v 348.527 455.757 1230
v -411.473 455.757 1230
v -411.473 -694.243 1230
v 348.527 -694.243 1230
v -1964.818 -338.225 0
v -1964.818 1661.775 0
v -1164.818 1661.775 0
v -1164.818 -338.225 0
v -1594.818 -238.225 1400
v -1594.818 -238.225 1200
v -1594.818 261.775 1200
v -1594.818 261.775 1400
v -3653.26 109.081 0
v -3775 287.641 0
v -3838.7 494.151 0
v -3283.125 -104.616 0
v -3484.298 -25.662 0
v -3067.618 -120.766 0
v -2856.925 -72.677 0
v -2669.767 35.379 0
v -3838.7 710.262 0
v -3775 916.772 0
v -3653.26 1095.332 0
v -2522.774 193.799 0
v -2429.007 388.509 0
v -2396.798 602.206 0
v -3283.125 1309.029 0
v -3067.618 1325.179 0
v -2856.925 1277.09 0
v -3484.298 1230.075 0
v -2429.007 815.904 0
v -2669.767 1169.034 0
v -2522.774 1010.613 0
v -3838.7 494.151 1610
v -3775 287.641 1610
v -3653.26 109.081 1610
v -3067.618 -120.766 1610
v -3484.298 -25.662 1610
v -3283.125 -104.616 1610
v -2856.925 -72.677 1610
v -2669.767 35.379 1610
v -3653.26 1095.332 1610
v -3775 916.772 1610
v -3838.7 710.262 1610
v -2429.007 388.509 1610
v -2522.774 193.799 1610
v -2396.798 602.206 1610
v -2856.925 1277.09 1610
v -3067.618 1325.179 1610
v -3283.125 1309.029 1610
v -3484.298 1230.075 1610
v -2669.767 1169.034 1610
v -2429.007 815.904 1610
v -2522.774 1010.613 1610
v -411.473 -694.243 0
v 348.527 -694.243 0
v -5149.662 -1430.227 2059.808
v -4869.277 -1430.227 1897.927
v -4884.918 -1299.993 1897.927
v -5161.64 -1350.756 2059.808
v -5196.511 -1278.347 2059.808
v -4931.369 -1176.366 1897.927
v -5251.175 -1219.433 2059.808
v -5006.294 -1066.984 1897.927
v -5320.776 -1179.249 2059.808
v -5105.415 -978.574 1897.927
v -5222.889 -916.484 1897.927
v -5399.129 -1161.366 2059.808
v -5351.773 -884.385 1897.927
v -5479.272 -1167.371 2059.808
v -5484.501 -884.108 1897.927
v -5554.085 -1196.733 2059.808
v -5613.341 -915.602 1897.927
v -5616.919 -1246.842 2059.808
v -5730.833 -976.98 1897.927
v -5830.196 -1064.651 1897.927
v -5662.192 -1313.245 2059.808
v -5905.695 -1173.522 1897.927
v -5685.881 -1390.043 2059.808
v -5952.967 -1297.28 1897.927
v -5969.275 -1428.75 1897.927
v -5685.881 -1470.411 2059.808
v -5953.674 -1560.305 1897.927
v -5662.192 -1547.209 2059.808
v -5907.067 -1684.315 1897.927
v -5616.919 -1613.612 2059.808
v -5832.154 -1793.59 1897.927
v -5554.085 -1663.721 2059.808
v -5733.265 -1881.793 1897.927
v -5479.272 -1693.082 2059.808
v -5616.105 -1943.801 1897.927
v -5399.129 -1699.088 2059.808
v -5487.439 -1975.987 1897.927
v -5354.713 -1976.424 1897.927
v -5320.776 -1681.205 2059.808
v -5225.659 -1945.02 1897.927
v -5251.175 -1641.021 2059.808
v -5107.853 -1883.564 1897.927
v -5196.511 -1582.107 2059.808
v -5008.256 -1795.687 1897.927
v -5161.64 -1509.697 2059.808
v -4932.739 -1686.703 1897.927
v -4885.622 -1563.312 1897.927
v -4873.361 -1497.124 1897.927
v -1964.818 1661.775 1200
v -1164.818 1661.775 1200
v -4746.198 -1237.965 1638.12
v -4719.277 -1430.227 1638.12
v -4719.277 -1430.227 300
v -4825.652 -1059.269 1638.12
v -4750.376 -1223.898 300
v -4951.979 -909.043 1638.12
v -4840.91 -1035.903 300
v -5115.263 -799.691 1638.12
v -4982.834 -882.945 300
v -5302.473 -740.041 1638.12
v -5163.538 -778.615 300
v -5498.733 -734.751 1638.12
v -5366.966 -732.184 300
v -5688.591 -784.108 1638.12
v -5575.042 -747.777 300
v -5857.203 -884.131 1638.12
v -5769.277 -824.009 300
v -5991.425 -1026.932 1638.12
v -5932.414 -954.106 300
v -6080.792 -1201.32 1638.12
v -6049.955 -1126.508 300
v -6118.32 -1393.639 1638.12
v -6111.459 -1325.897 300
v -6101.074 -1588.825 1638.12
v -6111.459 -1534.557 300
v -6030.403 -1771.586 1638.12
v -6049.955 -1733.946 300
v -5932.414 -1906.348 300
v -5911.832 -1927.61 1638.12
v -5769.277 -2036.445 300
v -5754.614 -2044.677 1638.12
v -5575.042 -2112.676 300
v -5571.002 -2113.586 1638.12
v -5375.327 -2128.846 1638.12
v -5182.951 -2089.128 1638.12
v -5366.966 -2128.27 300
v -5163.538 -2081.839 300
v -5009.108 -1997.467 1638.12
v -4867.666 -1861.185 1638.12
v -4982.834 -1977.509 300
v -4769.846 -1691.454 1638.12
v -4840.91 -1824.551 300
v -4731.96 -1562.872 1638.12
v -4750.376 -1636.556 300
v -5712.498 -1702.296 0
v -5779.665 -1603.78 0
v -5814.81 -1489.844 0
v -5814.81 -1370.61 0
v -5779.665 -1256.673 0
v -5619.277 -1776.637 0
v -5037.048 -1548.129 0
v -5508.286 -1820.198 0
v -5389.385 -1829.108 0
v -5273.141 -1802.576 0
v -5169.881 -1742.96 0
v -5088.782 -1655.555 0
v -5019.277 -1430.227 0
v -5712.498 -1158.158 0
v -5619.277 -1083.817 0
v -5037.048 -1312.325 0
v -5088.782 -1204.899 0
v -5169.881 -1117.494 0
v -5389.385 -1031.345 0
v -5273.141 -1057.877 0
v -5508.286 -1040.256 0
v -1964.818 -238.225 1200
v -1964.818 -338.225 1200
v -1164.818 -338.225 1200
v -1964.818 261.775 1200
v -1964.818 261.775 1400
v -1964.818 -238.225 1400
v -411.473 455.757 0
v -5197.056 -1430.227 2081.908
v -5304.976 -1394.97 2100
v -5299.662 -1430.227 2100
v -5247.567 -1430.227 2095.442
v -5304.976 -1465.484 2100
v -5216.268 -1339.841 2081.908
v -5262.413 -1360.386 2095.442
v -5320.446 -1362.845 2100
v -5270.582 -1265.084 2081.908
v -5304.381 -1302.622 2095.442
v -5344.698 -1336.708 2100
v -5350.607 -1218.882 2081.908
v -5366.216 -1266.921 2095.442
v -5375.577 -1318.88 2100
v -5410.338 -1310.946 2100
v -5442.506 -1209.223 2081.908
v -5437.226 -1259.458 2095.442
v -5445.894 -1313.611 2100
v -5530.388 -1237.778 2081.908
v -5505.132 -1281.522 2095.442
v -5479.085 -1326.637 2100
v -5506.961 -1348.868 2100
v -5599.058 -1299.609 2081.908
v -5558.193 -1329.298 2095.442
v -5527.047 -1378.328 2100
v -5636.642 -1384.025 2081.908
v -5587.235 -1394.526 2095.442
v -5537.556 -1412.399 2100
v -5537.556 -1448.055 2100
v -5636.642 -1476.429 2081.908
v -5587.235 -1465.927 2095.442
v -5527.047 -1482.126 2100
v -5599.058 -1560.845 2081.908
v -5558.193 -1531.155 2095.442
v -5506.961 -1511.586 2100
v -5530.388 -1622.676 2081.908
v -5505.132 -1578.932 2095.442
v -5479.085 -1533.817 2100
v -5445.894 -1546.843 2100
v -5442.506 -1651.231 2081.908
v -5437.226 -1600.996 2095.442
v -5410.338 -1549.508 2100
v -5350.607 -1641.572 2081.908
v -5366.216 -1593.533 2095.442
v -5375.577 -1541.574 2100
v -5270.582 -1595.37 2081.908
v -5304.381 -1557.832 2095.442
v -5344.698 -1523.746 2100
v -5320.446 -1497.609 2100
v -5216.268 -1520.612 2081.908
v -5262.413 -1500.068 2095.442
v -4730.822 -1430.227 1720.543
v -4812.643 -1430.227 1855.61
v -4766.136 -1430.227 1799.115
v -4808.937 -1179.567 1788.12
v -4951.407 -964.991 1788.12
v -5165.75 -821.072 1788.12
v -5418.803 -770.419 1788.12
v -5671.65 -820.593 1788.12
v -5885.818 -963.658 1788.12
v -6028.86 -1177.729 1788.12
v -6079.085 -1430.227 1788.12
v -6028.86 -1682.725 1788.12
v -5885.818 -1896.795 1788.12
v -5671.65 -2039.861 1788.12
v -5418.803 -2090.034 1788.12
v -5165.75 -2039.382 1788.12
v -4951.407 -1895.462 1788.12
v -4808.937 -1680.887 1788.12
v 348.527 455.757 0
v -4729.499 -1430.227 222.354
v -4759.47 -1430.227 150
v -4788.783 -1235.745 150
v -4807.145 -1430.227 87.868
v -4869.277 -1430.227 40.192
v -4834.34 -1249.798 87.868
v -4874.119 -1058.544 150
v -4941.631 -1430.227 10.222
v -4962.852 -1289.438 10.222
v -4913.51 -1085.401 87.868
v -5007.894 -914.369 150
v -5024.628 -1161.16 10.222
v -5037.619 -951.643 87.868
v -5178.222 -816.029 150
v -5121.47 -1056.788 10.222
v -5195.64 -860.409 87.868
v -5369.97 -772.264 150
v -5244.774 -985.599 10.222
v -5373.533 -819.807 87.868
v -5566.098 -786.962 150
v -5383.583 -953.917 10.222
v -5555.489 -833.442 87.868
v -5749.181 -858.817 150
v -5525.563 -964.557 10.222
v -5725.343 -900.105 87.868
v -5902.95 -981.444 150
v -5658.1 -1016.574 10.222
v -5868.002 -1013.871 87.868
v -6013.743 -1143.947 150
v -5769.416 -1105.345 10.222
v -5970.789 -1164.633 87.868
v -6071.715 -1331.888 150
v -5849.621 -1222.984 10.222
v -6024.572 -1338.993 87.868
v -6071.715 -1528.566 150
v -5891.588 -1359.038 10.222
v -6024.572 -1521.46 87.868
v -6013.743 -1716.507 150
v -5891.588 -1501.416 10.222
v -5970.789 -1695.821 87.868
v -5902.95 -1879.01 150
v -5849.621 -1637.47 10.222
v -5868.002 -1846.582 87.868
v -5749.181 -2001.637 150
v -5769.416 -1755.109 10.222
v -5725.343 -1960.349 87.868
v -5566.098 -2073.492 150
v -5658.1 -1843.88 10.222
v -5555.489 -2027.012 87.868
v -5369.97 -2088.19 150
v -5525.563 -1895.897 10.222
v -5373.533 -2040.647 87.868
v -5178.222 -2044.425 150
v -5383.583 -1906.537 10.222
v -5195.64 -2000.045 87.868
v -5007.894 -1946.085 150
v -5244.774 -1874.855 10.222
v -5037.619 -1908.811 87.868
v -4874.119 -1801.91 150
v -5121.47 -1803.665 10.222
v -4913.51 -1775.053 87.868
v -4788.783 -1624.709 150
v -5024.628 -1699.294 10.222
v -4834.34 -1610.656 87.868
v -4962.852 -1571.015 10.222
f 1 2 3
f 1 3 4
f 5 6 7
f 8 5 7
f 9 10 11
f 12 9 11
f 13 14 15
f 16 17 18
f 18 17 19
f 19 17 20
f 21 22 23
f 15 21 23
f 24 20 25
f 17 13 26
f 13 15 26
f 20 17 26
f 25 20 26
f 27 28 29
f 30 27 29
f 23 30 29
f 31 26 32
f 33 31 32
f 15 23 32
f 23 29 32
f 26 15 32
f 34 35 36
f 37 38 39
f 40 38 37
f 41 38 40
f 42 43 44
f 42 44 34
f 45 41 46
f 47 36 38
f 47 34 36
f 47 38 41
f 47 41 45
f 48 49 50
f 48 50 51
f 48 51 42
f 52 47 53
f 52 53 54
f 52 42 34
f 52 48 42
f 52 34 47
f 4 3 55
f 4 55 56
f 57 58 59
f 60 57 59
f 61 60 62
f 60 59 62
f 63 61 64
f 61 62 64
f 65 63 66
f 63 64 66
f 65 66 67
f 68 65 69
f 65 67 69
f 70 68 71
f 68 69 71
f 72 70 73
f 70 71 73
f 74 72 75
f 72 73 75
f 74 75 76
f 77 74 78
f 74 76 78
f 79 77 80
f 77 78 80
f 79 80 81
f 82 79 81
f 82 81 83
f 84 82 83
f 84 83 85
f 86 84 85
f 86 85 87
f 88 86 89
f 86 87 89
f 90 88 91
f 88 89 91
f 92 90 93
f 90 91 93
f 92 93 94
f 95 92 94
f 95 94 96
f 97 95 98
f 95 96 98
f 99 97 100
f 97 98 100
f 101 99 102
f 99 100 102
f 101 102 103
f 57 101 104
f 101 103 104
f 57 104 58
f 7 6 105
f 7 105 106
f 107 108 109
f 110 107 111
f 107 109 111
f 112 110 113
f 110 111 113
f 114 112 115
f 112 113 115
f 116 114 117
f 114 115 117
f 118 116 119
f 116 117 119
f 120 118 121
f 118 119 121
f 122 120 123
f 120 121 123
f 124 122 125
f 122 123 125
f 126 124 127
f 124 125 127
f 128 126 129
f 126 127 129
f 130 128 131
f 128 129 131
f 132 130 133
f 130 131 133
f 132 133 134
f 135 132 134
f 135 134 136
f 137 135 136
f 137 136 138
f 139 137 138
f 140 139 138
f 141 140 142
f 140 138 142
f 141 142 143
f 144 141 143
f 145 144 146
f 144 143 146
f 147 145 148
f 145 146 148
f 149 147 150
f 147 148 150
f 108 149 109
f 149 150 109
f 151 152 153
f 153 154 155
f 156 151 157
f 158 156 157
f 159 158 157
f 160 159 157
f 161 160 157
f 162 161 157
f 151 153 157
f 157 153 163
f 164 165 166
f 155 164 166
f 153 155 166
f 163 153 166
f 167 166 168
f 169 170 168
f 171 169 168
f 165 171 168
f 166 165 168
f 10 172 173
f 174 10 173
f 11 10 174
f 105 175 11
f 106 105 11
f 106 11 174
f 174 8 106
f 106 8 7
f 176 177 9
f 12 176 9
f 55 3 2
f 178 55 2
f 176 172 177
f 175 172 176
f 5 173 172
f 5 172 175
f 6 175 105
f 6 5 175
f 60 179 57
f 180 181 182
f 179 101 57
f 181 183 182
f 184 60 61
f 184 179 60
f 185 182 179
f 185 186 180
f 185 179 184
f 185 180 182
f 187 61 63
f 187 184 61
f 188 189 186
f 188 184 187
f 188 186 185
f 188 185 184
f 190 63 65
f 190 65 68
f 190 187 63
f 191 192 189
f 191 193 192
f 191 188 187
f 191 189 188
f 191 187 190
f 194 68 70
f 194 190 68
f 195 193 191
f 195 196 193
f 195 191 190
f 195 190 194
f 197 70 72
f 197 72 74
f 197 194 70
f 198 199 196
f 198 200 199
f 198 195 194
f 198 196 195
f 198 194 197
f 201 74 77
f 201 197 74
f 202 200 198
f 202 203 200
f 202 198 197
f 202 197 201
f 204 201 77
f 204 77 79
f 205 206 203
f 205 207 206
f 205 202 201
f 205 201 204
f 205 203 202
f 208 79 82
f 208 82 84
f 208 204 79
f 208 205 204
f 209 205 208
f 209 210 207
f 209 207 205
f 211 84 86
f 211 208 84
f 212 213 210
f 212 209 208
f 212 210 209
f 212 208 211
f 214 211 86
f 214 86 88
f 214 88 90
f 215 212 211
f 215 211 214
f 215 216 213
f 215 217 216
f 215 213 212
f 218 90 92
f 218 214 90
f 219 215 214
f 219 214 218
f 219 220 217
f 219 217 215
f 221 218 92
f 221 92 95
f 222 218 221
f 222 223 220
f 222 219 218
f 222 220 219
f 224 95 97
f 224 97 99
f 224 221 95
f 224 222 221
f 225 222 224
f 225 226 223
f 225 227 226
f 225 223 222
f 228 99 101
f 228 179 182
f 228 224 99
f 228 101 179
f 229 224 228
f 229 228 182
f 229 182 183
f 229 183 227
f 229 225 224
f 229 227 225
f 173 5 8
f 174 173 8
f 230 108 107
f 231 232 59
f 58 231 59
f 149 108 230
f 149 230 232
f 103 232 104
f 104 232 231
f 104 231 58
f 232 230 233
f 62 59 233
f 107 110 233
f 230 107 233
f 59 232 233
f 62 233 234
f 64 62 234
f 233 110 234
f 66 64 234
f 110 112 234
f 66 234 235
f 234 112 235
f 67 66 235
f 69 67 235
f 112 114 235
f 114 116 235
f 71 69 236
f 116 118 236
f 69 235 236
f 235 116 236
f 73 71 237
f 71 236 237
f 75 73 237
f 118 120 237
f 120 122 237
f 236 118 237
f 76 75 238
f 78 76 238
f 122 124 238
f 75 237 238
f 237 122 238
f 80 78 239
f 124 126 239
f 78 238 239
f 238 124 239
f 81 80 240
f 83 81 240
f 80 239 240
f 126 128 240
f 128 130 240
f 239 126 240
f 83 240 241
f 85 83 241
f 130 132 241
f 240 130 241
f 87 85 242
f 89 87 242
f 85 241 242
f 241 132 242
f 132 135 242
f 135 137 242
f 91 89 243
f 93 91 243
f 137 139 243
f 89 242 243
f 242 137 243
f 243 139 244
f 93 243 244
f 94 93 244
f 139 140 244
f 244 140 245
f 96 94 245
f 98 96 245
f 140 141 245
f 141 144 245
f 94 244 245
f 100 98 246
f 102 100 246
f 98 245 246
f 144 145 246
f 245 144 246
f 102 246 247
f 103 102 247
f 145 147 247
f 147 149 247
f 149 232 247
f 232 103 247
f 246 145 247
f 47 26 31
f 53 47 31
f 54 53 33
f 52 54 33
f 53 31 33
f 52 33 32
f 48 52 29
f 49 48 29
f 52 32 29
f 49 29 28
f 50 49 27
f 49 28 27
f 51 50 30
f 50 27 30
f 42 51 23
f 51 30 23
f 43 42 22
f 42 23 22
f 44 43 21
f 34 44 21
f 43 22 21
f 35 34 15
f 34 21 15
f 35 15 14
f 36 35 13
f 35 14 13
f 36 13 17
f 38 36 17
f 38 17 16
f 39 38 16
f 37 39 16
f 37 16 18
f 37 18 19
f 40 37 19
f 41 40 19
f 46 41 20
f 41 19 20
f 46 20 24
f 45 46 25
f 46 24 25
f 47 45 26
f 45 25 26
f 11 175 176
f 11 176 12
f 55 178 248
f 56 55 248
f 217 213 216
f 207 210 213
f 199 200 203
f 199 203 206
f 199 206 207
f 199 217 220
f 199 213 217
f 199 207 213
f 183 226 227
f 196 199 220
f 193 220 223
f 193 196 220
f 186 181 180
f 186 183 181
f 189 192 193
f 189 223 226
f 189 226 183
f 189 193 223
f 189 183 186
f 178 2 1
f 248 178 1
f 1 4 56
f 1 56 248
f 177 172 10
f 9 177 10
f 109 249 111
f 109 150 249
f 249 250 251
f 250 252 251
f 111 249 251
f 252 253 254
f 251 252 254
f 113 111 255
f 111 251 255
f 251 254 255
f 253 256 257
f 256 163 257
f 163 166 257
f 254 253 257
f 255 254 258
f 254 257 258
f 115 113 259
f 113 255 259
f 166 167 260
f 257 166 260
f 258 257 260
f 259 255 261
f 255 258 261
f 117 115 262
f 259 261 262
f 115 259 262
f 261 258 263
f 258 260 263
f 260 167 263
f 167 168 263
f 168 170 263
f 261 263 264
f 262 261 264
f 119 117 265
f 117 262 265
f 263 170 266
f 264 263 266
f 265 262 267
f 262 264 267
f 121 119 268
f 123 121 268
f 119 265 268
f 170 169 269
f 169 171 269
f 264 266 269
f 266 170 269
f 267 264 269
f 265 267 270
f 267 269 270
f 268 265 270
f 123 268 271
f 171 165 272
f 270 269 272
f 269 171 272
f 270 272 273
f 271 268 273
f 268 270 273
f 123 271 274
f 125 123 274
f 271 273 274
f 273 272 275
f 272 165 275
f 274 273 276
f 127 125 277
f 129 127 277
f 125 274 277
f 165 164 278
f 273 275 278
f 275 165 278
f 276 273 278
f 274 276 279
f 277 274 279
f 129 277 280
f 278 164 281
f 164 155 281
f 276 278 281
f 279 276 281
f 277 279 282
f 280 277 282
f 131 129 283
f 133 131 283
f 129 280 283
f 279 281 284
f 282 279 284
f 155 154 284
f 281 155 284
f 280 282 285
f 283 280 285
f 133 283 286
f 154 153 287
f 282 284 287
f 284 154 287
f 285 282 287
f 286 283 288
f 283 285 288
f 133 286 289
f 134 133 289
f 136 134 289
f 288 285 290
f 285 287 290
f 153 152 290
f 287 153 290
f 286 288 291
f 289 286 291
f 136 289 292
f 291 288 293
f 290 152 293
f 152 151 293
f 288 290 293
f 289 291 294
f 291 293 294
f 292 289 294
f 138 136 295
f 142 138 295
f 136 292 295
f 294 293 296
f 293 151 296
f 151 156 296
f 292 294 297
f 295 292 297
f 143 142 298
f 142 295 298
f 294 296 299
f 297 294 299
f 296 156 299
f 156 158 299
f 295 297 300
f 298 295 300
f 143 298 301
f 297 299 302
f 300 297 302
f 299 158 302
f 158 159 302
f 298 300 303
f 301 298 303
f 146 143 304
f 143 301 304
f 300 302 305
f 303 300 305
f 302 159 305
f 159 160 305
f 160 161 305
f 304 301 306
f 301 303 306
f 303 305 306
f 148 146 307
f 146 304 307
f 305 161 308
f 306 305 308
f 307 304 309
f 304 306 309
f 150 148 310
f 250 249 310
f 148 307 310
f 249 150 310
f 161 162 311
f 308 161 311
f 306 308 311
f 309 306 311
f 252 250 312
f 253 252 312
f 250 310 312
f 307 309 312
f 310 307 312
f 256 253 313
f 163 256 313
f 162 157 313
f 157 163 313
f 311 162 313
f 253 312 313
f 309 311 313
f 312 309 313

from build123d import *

# Parameters (mm, degrees)
F0_W      = 760
F0_H      = 1150
F1_DEPTH  = 1230
F2_R      = 725
F3_DEPTH  = 1610
F4_W      = 800
F4_H      = 2000
F5_DEPTH  = 1200
F6_W      = 370
F6_H      = 500
F7_DEPTH  = 200
F8_R      = 700
F9_DEPTH  = 2100
F10_R     = 300
F11_SIZE2 = 288.6751345948
F11_SIZE  = 500
F12_R     = 300


with BuildPart() as f1:
    # F0 (on Top) → F1 (new body)
    with BuildSketch(Plane.XY):
        with Locations((-31.4733404666, -119.2426998605)):
            Rectangle(F0_W, F0_H)
    extrude(amount=F1_DEPTH)


with BuildPart() as f3:
    # F2 (on Top) → F3 (new body)
    with BuildSketch(Plane.XY):
        with Locations((-3121.7975616455, 602.2063493729)):
            Circle(F2_R)
    extrude(amount=F3_DEPTH)


with BuildPart() as f5:
    # F4 (on Top) → F5 (new body)
    with BuildSketch(Plane.XY):
        with Locations((-1564.8182034492, 661.7751377383)):
            Rectangle(F4_W, F4_H)
    extrude(amount=F5_DEPTH)

    # F6 (on face) → F7 (join)
    with BuildSketch(Plane.XY.offset(1200)):
        with Locations((-1779.8182034492, 11.7751377383)):
            Rectangle(F6_W, F6_H)
    extrude(amount=F7_DEPTH)


with BuildPart() as f9:
    # F8 (on Top) → F9 (new body)
    with BuildSketch(Plane.XY):
        with Locations((-5419.2771911621, -1430.2269220352)):
            Circle(F8_R)
    extrude(amount=F9_DEPTH)

    # F10
    f10_edges = [f9.edges().sort_by_distance(p)[0] for p in [
        (-6119.277191, -1430.226922, 0),
    ]]
    fillet(f10_edges, radius=F10_R)

    # F11
    f11_edges = [f9.edges().sort_by_distance(p)[0] for p in [
        (-6119.277191, -1430.226922, 2100),
    ]]
    f11_side = f9.faces().sort_by_distance((-5419.277191, -1430.226922, 2100))[0]
    chamfer(f11_edges, length=F11_SIZE, length2=F11_SIZE2, reference=f11_side)

    # F12
    f12_edges = [f9.edges().sort_by_distance(p)[0] for p in [
        (-6119.277191, -1430.226922, 1811.324865),
        (-5619.277191, -1430.226922, 2100),
    ]]
    fillet(f12_edges, radius=F12_R)


solid = Compound([f1.part, f3.part, f5.part, f9.part])
